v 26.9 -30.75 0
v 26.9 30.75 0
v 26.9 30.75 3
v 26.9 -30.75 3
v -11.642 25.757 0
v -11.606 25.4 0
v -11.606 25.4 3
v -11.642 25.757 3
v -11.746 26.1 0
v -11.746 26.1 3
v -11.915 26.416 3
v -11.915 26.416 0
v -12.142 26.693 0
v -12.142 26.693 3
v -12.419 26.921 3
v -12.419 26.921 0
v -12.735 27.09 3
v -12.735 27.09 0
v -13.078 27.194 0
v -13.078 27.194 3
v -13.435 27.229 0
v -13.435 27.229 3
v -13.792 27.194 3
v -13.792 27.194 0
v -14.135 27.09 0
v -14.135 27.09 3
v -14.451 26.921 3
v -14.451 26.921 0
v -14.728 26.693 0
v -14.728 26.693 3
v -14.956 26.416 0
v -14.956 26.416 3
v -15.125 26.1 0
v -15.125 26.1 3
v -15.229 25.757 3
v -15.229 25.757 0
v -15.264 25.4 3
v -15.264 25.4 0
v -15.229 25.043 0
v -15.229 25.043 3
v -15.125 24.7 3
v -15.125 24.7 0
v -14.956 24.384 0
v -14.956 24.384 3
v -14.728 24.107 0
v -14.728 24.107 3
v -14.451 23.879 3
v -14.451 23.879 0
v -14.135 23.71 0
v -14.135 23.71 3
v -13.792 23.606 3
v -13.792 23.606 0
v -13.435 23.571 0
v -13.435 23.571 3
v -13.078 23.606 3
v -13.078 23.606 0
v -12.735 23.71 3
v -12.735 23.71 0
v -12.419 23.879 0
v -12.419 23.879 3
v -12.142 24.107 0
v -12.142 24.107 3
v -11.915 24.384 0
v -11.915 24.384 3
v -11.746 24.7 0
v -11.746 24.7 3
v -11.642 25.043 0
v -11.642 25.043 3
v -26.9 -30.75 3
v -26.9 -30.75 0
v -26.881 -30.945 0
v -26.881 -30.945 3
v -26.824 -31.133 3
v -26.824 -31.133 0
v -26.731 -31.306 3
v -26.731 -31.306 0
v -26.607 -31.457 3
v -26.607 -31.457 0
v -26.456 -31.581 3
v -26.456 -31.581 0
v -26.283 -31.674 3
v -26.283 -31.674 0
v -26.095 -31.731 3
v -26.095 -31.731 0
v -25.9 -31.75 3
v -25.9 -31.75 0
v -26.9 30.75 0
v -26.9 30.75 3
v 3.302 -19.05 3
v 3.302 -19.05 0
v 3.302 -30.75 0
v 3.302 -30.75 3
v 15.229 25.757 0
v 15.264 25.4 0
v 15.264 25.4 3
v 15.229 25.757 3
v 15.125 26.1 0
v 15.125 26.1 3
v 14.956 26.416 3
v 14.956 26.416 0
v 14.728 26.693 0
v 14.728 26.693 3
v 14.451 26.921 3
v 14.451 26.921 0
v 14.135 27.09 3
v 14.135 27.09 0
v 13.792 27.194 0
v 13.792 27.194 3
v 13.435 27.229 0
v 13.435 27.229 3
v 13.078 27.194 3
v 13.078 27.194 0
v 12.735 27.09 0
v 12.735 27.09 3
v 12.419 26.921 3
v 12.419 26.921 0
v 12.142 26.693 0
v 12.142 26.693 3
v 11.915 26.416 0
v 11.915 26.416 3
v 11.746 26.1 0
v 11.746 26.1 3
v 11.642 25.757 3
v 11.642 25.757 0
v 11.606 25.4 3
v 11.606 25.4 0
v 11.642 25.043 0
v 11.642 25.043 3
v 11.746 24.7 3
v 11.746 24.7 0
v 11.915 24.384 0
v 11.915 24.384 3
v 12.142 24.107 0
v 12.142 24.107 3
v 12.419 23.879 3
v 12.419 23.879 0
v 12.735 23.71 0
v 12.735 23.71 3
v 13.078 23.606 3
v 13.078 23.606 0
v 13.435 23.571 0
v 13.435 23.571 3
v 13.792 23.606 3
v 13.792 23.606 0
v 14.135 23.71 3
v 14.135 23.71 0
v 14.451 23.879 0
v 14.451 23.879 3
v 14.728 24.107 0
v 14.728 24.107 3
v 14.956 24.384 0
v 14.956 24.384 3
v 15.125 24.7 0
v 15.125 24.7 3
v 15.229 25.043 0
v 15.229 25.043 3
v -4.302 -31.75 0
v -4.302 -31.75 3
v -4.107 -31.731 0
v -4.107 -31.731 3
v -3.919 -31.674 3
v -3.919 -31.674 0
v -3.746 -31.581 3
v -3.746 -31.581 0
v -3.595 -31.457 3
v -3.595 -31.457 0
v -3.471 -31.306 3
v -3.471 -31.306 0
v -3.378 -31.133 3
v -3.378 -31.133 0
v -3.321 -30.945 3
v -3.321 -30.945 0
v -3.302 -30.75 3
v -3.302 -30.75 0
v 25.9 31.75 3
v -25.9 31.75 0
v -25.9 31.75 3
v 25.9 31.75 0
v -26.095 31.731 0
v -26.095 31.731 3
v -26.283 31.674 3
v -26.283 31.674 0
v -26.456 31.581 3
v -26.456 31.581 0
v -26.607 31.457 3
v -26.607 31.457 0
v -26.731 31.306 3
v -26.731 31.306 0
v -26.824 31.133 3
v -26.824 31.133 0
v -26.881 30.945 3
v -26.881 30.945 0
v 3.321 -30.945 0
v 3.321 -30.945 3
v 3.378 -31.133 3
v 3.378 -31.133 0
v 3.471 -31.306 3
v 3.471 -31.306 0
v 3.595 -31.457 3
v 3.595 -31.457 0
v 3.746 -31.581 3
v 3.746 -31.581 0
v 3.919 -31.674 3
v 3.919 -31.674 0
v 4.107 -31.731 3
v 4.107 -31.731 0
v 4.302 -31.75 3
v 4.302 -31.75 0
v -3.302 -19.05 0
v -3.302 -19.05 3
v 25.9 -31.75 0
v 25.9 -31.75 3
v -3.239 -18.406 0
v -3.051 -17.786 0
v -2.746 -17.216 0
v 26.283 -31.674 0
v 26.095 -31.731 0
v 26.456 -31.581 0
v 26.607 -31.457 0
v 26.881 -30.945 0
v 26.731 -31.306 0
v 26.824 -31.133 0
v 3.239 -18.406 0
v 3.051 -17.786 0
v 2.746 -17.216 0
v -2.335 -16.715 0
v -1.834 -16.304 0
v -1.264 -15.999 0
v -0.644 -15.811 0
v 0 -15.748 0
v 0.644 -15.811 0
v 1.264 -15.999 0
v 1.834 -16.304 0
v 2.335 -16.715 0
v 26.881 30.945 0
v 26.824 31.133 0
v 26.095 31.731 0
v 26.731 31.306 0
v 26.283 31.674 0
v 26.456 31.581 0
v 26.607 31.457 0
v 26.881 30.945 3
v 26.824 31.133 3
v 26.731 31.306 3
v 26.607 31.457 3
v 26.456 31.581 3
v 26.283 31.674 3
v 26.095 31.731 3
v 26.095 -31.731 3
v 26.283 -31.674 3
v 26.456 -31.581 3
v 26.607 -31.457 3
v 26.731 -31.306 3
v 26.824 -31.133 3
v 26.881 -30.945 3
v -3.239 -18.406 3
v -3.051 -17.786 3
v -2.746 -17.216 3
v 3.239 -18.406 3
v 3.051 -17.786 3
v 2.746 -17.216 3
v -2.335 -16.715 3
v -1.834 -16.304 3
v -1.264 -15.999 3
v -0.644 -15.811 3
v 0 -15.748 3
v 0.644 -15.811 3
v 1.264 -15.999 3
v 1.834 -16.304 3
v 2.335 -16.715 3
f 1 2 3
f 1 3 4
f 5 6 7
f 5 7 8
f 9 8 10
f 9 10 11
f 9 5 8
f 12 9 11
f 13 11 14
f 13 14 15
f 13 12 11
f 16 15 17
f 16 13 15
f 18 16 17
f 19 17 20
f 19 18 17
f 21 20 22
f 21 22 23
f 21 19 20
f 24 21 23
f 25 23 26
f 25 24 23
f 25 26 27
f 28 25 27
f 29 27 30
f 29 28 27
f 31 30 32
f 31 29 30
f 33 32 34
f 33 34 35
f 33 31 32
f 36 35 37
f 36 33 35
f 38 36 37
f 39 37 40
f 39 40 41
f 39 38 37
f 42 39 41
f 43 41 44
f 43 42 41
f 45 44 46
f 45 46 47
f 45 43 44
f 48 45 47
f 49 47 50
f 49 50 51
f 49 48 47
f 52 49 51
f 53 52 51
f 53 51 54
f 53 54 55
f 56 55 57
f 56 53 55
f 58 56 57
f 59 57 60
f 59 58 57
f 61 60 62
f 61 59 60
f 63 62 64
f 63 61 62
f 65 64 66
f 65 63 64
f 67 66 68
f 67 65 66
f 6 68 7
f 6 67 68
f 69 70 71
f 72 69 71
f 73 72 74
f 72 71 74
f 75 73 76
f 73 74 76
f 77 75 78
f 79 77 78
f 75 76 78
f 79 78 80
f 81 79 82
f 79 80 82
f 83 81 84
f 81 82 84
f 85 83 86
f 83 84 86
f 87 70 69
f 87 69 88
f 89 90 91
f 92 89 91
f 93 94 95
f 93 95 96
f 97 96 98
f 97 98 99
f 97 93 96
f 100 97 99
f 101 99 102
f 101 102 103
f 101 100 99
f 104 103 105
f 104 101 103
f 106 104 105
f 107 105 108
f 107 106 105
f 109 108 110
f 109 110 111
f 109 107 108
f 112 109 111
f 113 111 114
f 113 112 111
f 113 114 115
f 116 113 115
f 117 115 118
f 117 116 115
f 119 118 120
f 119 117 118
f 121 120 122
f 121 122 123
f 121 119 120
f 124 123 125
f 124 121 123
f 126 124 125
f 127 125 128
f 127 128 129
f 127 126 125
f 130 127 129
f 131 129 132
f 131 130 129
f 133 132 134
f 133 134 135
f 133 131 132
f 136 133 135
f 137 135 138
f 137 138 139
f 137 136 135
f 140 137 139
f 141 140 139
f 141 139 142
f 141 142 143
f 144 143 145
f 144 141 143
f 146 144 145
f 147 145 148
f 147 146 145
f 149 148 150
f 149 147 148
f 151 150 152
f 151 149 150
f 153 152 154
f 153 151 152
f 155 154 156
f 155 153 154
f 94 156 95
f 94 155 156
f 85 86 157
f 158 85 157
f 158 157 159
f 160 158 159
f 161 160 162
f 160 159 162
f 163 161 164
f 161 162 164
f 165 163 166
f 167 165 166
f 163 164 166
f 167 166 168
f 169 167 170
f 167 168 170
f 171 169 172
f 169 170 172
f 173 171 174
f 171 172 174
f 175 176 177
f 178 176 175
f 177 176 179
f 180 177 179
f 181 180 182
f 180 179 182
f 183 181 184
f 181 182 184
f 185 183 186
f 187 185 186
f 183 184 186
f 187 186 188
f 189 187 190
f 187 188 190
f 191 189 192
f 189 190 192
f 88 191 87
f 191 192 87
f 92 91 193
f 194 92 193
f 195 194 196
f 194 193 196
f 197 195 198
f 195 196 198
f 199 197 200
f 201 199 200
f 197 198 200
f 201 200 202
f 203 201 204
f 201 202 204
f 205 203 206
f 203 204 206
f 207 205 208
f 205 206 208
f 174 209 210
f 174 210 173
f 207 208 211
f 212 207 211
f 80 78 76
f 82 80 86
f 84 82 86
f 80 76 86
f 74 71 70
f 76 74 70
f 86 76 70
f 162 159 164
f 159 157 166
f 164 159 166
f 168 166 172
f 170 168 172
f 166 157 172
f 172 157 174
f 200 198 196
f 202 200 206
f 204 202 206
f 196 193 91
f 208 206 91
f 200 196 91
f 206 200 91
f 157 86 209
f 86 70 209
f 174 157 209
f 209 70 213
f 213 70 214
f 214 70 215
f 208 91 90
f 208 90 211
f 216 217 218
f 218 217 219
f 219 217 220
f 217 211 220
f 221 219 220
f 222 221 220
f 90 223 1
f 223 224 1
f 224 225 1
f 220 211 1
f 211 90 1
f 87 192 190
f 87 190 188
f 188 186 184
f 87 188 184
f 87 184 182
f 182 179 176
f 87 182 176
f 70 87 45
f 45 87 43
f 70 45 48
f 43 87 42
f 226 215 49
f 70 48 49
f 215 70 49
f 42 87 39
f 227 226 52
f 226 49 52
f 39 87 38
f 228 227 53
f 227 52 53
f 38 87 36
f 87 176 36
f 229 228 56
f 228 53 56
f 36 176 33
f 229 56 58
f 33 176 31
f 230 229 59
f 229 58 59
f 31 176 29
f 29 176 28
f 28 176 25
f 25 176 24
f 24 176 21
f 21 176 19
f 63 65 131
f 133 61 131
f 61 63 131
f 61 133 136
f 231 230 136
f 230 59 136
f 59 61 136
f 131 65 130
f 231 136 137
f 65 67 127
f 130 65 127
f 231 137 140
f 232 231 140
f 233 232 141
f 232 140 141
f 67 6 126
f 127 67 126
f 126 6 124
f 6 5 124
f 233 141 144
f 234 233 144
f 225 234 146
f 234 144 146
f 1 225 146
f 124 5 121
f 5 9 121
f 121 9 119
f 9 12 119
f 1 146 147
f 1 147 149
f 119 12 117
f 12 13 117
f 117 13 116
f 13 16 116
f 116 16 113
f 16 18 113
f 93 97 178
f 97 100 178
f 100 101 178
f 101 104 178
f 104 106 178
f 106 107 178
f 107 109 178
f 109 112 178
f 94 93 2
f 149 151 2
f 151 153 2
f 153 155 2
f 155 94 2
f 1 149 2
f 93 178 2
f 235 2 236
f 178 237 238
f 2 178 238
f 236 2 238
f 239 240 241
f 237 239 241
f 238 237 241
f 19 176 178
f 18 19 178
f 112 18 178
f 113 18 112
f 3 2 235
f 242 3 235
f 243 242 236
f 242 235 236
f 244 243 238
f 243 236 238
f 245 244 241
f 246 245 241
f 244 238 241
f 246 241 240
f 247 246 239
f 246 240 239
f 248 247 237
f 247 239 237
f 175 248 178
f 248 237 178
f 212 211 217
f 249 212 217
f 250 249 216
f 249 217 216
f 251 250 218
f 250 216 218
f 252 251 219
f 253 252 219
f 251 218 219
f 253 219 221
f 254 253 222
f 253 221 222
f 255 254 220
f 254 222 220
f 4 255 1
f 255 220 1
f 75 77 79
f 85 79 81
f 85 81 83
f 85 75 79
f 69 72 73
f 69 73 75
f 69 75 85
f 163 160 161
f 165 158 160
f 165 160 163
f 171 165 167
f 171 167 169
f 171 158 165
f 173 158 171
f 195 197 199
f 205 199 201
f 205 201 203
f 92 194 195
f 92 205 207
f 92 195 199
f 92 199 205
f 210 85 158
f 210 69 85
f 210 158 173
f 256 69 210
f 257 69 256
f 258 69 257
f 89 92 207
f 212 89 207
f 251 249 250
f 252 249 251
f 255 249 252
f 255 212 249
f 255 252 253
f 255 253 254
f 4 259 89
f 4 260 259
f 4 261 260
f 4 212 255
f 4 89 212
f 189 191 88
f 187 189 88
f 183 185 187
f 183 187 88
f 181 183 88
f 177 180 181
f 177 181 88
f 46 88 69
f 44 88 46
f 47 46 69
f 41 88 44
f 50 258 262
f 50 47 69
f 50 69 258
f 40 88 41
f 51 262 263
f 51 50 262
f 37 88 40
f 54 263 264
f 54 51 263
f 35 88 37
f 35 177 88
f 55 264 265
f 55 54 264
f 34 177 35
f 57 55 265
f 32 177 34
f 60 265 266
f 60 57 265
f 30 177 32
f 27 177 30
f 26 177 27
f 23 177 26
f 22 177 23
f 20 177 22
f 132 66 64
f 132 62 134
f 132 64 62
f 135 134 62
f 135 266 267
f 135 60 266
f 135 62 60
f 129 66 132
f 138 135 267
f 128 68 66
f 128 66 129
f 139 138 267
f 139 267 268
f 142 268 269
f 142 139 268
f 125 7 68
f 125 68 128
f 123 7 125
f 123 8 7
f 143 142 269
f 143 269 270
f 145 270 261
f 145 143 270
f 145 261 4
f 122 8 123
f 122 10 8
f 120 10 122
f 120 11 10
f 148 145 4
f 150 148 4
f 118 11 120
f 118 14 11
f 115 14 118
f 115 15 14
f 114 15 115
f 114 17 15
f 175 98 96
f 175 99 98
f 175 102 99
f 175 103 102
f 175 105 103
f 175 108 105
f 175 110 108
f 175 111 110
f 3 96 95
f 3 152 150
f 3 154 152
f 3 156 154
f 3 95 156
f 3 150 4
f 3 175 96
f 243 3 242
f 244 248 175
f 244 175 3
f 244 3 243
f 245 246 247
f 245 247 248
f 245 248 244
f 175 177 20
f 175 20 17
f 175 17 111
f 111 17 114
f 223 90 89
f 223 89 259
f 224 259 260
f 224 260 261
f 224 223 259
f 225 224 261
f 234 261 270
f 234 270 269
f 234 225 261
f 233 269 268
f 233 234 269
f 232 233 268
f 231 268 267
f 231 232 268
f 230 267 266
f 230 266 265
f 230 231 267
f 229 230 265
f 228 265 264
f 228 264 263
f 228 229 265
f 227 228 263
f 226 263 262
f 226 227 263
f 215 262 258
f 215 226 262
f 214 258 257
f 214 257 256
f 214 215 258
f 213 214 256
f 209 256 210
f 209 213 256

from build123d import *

# Parameters (mm, degrees)
SKETCH_R  = 1.8288
PAD_DEPTH = 3


with BuildPart() as part:
    # Sketch → Pad (new body)
    with BuildSketch(Plane.XY):
        with BuildLine():
            ThreePointArc((-25.9, 31.75), (-26.607107, 31.457107), (-26.9, 30.75))
            Line((-26.9, -30.75), (-26.9, 30.75))
            ThreePointArc((-26.9, -30.75), (-26.607107, -31.457107), (-25.9, -31.75))
            Line((-25.9, -31.75), (-4.302, -31.75))
            ThreePointArc((-4.302, -31.75), (-3.594893, -31.457107), (-3.302, -30.75))
            Line((-3.302, -19.05), (-3.302, -30.75))
            ThreePointArc((3.302, -19.05), (0, -15.748), (-3.302, -19.05))
            Line((3.302, -19.05), (3.302, -30.75))
            ThreePointArc((3.302, -30.75), (3.594893, -31.457107), (4.302, -31.75))
            Line((4.302, -31.75), (25.9, -31.75))
            ThreePointArc((25.9, -31.75), (26.607107, -31.457107), (26.9, -30.75))
            Line((26.9, 30.75), (26.9, -30.75))
            ThreePointArc((26.9, 30.75), (26.607107, 31.457107), (25.9, 31.75))
            Line((-25.9, 31.75), (25.9, 31.75))
        make_face()
        with Locations((-13.4352, 25.4)):
            Circle(SKETCH_R, mode=Mode.SUBTRACT)
        with Locations((13.4352, 25.4)):
            Circle(SKETCH_R, mode=Mode.SUBTRACT)
    extrude(amount=PAD_DEPTH)


solid = part.part
